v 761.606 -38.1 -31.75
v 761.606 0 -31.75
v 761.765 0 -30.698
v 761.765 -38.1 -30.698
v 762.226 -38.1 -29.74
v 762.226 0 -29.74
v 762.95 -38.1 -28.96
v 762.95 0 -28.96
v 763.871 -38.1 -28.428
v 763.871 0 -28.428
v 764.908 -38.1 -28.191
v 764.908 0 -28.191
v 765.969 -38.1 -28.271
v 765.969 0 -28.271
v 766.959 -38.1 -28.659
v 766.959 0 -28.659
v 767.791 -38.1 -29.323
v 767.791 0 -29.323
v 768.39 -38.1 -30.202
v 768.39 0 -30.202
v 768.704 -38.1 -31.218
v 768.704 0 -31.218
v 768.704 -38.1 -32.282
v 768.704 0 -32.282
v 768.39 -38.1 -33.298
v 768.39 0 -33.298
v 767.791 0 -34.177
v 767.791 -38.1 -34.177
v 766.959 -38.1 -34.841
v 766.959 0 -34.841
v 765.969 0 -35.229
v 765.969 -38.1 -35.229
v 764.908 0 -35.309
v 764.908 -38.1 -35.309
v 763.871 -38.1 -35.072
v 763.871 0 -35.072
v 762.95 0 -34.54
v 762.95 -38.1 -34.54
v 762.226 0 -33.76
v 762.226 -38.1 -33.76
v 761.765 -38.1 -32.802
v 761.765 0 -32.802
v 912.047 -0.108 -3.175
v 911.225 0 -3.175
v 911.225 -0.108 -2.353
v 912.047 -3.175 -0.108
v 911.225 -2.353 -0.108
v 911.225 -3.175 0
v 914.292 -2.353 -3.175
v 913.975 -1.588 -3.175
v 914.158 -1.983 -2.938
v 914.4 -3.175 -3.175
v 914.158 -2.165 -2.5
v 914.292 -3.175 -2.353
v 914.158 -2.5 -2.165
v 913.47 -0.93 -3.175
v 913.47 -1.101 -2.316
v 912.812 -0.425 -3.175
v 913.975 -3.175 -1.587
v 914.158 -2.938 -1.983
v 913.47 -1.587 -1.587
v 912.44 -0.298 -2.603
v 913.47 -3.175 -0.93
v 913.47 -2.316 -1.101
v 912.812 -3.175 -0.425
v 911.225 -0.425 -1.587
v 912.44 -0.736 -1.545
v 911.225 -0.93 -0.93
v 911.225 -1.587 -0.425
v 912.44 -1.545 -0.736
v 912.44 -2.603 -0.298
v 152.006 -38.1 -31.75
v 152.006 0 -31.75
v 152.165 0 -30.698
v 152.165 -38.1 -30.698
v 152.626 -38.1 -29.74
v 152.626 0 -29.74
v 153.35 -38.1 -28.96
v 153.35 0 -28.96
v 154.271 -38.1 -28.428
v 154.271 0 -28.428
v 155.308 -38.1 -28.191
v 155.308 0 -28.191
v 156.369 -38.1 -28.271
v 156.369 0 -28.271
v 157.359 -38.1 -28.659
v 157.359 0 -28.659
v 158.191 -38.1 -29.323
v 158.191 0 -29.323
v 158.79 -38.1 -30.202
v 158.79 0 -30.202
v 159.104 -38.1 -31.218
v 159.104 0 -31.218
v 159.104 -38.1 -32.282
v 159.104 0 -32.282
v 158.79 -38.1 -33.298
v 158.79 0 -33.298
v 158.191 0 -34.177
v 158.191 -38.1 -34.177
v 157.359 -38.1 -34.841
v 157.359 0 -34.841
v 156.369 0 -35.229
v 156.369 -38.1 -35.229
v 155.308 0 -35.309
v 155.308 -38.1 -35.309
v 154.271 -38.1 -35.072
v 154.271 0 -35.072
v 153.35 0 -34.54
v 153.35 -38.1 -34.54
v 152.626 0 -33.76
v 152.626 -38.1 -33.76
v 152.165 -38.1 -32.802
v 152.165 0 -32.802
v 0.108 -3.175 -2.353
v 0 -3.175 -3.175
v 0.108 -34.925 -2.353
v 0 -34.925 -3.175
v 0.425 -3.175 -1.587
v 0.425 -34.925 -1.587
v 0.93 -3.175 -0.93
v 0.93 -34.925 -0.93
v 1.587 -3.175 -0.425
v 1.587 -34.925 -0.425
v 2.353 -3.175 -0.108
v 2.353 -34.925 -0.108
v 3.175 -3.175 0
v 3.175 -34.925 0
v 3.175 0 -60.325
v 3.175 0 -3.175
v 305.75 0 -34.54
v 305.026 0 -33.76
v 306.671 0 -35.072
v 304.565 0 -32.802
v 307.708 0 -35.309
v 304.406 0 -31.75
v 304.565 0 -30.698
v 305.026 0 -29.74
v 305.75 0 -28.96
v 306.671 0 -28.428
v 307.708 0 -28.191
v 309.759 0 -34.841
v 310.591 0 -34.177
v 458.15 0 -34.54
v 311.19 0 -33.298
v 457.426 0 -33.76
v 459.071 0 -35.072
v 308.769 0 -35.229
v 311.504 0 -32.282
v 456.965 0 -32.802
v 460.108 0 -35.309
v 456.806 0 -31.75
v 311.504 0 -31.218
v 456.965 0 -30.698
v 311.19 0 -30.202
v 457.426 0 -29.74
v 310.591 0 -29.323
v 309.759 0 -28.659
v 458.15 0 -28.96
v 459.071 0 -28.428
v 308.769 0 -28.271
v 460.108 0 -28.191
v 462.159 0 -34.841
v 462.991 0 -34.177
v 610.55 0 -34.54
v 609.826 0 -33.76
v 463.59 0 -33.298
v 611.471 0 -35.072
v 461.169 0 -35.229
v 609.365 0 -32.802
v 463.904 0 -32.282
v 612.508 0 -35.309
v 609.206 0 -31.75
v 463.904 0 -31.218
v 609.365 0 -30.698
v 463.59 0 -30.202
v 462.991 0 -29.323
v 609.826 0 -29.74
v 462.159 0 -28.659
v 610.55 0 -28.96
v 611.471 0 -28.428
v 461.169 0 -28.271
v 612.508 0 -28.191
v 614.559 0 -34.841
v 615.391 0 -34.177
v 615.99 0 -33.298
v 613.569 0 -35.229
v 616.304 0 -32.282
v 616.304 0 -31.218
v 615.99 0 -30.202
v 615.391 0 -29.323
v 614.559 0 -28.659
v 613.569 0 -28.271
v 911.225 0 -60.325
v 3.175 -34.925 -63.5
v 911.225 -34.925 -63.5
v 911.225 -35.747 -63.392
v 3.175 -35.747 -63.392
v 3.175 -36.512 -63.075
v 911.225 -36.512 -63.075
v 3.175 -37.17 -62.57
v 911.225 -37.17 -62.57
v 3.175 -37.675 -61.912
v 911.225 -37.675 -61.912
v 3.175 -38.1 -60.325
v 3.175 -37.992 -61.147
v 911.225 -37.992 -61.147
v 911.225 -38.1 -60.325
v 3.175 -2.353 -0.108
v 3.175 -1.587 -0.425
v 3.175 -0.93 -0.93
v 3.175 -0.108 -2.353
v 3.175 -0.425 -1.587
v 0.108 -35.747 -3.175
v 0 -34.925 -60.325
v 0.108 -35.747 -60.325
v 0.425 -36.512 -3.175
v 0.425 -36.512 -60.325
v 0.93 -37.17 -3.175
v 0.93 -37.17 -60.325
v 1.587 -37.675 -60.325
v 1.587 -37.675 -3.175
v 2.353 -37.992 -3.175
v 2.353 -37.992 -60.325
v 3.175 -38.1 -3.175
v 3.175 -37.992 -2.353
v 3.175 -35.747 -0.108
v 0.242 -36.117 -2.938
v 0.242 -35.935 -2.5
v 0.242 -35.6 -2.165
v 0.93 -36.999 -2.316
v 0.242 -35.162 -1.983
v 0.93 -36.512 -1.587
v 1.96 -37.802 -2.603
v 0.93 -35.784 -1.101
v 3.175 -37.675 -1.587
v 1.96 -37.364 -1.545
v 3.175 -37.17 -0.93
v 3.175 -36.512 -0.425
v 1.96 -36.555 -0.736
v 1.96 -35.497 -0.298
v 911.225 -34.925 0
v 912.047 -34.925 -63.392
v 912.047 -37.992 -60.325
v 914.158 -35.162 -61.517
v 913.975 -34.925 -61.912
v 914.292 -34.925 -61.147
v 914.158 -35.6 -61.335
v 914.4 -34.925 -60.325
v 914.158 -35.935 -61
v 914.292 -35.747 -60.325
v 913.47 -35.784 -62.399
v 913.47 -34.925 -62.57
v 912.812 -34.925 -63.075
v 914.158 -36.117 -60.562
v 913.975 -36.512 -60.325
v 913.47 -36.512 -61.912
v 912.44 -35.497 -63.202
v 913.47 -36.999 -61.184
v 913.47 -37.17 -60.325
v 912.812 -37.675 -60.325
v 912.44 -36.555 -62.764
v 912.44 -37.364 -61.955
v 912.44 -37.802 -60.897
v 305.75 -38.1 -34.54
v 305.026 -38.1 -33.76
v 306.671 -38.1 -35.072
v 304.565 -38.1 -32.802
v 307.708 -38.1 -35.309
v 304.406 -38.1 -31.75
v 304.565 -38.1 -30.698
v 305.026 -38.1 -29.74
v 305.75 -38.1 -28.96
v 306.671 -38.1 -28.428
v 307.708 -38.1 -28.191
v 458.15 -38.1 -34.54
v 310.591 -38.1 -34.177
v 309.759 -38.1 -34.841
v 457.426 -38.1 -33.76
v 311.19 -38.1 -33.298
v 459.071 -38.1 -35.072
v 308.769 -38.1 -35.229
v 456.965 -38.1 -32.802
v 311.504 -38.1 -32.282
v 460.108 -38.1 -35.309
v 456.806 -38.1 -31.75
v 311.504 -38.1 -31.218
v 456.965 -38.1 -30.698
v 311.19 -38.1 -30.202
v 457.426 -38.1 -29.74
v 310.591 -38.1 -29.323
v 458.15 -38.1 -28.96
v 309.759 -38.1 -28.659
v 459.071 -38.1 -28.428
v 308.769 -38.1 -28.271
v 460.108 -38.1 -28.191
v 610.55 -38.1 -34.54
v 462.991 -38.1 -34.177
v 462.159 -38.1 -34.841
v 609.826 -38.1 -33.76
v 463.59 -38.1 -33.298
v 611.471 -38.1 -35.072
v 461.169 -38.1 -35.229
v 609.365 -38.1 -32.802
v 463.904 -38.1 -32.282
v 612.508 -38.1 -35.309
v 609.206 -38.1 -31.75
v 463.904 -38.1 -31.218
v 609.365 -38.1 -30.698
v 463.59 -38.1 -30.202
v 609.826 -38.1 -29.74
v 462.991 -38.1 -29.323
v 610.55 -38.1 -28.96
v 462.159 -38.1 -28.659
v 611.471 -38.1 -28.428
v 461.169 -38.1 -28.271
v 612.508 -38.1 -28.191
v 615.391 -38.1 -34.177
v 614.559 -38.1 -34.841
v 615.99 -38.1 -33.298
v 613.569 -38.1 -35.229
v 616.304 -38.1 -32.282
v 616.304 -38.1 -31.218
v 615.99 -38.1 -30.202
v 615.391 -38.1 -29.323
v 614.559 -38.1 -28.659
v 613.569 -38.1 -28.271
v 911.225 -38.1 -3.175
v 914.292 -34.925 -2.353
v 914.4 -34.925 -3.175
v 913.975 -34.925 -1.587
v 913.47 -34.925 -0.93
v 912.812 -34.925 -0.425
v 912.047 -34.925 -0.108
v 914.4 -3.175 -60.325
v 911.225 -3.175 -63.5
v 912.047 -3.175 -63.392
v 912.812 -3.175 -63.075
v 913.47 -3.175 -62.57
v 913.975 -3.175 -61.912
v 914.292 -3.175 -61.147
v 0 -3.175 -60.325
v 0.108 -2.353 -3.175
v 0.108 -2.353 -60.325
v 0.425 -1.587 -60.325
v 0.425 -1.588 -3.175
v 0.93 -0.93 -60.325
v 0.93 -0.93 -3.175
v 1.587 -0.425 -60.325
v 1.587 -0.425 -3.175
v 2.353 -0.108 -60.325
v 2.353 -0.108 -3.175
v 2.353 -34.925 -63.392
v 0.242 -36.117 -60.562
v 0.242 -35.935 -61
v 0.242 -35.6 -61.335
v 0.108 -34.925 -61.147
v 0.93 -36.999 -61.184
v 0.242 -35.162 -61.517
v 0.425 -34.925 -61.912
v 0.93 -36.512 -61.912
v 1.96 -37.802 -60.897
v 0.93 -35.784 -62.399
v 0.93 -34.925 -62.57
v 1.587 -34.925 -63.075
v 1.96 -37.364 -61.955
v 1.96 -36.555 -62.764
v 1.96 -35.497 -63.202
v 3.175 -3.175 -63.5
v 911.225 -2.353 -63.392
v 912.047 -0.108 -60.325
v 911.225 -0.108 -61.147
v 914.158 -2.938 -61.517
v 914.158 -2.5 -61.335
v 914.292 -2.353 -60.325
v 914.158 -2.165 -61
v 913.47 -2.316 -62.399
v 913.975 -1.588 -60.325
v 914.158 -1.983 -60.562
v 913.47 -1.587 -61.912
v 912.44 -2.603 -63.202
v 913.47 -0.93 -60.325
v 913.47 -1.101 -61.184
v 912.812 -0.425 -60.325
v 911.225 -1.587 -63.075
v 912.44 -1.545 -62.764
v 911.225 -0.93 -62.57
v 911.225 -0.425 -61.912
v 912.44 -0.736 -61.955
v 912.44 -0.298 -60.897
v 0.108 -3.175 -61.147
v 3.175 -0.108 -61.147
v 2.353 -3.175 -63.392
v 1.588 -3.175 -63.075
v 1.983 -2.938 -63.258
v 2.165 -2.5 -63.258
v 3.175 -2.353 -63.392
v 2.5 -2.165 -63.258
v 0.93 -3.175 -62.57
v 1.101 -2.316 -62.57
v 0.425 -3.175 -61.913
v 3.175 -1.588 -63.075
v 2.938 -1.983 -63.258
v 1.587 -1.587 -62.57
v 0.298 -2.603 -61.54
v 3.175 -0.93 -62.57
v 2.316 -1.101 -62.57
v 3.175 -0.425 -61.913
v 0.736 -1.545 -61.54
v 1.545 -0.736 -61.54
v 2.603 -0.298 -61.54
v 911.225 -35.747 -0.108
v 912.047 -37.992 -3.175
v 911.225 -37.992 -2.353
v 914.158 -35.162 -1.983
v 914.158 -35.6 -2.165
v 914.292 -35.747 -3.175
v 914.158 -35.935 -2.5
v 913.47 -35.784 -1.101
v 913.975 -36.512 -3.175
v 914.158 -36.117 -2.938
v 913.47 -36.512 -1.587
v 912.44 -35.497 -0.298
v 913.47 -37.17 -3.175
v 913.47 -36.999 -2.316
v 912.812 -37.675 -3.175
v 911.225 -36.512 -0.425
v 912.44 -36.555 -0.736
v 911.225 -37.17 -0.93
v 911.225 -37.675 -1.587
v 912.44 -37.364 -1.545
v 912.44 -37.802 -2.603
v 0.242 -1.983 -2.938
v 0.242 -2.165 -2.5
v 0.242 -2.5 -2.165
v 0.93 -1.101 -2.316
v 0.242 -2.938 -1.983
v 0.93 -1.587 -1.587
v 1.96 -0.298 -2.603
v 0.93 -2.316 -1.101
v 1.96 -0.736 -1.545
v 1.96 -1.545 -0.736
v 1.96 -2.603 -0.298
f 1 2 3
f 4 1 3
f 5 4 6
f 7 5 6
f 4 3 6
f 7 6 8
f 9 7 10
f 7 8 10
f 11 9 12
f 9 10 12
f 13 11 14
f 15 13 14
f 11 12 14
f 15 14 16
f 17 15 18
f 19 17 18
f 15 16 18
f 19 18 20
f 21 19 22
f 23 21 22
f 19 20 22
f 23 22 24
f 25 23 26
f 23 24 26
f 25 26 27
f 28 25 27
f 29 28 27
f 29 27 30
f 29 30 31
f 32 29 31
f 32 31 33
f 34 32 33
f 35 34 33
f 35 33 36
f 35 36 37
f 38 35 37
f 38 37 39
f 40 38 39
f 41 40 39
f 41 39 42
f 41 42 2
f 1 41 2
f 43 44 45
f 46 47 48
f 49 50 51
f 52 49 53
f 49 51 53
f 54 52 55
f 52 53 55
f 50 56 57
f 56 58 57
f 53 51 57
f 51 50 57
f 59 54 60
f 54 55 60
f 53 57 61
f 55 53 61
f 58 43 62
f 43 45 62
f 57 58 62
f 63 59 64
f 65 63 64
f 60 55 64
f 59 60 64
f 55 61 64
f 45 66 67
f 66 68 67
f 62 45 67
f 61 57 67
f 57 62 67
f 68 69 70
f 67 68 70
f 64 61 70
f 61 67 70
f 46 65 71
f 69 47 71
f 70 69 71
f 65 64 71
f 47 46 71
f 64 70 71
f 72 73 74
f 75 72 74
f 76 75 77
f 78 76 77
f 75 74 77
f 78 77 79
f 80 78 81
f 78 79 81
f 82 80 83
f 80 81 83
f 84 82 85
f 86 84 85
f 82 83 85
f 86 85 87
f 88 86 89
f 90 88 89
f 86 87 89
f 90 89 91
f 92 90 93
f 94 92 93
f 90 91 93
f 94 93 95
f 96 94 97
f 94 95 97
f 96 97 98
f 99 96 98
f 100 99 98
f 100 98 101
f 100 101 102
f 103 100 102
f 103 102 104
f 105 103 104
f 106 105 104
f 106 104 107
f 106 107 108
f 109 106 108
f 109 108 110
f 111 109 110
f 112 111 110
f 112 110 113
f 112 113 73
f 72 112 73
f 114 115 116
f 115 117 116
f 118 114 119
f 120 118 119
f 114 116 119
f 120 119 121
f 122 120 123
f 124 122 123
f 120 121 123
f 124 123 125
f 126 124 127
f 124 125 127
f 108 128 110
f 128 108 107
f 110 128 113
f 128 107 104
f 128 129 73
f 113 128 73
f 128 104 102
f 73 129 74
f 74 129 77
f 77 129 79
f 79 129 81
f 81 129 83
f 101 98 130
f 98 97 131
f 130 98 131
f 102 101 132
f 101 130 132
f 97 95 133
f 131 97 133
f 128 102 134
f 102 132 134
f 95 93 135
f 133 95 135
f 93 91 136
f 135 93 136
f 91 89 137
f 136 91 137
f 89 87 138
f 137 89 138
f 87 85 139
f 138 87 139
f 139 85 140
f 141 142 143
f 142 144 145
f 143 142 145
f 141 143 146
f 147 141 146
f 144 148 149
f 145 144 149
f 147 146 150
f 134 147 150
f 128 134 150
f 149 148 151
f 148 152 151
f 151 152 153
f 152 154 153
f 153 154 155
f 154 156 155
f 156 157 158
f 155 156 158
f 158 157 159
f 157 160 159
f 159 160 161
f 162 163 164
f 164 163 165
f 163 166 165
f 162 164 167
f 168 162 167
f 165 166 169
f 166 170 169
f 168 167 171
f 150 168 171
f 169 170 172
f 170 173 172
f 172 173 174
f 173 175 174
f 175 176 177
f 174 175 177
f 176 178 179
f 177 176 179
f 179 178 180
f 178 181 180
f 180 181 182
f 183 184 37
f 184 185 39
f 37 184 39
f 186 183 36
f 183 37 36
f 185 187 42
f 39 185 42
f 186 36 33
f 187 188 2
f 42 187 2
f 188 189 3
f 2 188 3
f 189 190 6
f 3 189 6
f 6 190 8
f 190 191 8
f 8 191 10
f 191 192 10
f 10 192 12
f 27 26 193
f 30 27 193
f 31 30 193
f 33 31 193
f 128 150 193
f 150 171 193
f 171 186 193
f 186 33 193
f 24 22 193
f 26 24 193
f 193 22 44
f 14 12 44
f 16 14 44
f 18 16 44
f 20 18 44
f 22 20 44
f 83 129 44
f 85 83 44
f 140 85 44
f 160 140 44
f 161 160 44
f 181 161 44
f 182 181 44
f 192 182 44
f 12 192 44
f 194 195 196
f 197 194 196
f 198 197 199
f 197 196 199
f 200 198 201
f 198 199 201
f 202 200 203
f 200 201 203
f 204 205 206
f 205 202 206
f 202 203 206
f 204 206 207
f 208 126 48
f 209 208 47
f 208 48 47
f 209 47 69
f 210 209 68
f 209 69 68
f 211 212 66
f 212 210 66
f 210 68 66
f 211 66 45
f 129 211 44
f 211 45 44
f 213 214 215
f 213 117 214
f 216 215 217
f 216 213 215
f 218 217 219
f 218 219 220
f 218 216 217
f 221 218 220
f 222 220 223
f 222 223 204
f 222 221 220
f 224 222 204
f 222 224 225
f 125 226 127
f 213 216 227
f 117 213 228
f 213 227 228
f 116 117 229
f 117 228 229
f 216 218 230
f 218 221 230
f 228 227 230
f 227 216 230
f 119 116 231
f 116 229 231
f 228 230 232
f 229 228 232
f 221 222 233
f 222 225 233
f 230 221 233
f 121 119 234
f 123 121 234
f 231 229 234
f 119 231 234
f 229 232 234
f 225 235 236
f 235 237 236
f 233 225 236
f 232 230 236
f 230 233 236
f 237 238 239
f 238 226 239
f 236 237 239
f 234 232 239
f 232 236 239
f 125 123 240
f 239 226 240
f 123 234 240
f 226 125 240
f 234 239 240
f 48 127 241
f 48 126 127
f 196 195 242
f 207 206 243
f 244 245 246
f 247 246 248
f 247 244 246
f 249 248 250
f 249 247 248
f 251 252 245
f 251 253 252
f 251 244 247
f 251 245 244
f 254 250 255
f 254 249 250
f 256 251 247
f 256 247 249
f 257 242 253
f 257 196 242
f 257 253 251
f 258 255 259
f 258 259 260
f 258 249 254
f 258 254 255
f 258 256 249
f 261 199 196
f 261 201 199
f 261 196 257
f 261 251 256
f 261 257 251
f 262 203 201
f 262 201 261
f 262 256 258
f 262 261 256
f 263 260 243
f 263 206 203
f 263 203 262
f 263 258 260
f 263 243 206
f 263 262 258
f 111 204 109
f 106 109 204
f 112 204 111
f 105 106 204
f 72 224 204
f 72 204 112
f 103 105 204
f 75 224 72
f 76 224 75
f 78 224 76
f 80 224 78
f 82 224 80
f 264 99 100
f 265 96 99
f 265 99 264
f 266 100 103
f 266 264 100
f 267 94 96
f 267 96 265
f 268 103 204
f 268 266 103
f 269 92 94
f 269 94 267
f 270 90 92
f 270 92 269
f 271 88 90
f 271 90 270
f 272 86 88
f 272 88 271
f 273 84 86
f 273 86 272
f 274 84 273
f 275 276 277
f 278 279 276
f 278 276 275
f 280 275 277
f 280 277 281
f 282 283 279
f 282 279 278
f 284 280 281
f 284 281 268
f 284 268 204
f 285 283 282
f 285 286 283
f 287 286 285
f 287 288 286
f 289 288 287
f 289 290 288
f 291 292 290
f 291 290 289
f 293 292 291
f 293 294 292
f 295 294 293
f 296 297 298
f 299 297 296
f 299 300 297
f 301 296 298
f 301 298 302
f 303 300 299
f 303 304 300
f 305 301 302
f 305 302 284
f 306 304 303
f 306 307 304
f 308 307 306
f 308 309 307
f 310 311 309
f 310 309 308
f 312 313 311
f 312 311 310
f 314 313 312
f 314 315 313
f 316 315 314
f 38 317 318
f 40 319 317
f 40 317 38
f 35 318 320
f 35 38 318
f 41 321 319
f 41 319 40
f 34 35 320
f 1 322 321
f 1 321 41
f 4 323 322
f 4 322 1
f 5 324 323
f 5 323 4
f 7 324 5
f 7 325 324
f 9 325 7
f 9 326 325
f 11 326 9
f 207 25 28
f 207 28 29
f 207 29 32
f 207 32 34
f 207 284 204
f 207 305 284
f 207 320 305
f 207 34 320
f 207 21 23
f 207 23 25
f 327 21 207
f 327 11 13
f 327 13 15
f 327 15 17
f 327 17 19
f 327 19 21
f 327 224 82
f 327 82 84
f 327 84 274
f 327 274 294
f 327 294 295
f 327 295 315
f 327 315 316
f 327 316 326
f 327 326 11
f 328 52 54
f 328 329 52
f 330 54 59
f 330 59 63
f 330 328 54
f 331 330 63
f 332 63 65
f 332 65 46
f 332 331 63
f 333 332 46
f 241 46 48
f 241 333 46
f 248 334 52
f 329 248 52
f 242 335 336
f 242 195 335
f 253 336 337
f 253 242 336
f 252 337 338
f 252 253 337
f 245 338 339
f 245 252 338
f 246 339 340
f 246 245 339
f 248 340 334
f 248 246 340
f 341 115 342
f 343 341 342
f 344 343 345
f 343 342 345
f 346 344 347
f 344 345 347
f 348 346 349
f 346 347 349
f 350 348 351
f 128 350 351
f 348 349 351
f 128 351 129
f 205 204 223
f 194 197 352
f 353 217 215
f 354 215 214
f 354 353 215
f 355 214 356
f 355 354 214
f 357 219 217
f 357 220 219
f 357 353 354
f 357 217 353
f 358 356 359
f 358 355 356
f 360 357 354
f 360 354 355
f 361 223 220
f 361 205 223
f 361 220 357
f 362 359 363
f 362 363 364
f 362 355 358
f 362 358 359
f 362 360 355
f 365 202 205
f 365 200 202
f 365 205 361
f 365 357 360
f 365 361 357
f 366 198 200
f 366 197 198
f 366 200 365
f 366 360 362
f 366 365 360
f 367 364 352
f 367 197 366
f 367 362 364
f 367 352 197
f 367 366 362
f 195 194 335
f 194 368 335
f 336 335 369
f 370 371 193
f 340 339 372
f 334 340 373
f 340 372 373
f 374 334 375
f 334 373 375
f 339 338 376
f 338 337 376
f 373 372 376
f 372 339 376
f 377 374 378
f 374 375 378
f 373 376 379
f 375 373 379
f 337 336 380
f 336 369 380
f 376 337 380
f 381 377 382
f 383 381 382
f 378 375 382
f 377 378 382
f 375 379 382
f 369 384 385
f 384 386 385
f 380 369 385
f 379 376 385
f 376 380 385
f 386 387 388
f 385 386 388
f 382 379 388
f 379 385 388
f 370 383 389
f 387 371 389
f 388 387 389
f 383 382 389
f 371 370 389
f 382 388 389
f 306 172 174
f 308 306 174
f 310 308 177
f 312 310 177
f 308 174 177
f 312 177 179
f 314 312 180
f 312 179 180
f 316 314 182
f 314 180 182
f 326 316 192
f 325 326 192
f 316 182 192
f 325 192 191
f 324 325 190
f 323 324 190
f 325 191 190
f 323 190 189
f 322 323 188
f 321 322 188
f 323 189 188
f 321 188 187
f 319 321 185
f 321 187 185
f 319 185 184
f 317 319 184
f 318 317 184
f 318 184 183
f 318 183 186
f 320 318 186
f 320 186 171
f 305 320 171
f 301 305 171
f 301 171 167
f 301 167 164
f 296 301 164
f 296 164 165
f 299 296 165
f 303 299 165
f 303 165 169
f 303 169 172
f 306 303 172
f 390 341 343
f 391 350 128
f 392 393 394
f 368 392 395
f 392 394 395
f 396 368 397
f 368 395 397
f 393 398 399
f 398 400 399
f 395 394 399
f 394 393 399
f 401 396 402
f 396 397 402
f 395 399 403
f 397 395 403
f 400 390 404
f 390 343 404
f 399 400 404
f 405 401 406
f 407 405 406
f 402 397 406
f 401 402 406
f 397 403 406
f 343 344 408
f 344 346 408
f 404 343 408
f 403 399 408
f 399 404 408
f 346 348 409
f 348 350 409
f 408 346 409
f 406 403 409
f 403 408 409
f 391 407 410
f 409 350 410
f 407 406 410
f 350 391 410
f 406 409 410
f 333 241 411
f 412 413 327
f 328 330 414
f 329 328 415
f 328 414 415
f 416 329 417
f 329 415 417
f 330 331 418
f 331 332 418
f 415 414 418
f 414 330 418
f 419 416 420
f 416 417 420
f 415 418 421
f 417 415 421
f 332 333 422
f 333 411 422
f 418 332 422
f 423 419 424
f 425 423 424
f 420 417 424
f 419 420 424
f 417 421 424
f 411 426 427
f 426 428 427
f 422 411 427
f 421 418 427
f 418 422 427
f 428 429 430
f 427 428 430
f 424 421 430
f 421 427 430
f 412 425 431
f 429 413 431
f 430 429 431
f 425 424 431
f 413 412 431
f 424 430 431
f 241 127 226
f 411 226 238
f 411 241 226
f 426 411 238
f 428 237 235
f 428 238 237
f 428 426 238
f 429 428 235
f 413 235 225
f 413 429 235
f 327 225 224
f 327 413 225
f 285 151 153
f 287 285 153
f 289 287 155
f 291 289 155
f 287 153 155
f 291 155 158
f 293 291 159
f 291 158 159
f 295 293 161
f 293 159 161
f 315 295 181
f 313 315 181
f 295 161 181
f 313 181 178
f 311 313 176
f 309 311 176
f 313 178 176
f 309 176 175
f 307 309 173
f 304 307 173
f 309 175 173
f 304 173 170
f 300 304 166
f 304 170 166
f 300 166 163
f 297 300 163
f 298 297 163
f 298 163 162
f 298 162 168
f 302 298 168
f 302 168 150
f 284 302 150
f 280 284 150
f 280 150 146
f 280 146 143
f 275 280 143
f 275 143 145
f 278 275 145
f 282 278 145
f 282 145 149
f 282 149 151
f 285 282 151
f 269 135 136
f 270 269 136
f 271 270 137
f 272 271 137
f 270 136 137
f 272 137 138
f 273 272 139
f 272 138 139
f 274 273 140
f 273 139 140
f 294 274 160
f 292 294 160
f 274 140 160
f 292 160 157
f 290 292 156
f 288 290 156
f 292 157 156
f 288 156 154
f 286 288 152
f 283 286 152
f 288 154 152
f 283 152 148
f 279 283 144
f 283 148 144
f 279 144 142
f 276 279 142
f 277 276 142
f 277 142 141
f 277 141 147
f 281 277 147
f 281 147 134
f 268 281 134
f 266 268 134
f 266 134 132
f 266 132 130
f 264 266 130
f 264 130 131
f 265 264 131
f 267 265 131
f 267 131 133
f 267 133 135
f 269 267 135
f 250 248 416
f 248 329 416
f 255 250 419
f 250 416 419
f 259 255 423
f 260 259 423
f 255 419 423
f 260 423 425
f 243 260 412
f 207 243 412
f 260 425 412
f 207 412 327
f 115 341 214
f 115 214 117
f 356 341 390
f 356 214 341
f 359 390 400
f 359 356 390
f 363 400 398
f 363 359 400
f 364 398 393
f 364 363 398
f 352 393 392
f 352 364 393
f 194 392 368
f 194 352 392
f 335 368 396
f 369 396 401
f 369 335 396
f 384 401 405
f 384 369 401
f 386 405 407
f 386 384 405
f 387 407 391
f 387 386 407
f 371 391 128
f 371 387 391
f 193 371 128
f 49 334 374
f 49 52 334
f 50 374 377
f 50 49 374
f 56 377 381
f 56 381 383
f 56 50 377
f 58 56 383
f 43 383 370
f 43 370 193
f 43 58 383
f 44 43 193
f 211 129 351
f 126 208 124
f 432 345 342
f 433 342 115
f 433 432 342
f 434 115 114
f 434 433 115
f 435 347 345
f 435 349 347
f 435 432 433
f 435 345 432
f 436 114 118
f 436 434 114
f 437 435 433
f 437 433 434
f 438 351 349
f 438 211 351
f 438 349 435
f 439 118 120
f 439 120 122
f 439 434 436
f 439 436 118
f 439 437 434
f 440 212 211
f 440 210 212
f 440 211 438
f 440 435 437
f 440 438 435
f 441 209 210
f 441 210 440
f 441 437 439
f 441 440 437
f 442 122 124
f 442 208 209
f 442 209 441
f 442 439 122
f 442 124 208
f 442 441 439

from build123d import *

# Parameters (mm, degrees)
F0_W     = 914.4
F0_H     = 63.5
F1_DEPTH = 38.1
F2_R     = 3.175
F4_D     = 7.1374


with BuildPart() as f1:
    # F0 (on Front) → F1 (new body)
    with BuildSketch(Plane.XZ):
        with Locations((457.2, -31.75)):
            Rectangle(F0_W, F0_H)
    extrude(amount=F1_DEPTH)

    # F2
    f2_edges = [f1.edges().sort_by_distance(p)[0] for p in [
        (457.2, -38.1, 0),
        (457.2, 0, 0),
        (457.2, -38.1, -63.5),
        (0, 0, -31.75),
        (0, -38.1, -31.75),
        (0, -19.05, 0),
        (0, -19.05, -63.5),
        (457.2, 0, -63.5),
        (914.4, -19.05, -63.5),
        (914.4, 0, -31.75),
        (914.4, -19.05, 0),
        (914.4, -38.1, -31.75),
    ]]
    fillet(f2_edges, radius=F2_R)

    # F4 (through all)
    with Locations(Plane.XZ.offset(38.1)):
        with Locations((155.575, -31.75), (307.975, -31.75), (612.775, -31.75), (460.375, -31.75), (765.175, -31.75)):
            Hole(F4_D / 2)


solid = f1.part
